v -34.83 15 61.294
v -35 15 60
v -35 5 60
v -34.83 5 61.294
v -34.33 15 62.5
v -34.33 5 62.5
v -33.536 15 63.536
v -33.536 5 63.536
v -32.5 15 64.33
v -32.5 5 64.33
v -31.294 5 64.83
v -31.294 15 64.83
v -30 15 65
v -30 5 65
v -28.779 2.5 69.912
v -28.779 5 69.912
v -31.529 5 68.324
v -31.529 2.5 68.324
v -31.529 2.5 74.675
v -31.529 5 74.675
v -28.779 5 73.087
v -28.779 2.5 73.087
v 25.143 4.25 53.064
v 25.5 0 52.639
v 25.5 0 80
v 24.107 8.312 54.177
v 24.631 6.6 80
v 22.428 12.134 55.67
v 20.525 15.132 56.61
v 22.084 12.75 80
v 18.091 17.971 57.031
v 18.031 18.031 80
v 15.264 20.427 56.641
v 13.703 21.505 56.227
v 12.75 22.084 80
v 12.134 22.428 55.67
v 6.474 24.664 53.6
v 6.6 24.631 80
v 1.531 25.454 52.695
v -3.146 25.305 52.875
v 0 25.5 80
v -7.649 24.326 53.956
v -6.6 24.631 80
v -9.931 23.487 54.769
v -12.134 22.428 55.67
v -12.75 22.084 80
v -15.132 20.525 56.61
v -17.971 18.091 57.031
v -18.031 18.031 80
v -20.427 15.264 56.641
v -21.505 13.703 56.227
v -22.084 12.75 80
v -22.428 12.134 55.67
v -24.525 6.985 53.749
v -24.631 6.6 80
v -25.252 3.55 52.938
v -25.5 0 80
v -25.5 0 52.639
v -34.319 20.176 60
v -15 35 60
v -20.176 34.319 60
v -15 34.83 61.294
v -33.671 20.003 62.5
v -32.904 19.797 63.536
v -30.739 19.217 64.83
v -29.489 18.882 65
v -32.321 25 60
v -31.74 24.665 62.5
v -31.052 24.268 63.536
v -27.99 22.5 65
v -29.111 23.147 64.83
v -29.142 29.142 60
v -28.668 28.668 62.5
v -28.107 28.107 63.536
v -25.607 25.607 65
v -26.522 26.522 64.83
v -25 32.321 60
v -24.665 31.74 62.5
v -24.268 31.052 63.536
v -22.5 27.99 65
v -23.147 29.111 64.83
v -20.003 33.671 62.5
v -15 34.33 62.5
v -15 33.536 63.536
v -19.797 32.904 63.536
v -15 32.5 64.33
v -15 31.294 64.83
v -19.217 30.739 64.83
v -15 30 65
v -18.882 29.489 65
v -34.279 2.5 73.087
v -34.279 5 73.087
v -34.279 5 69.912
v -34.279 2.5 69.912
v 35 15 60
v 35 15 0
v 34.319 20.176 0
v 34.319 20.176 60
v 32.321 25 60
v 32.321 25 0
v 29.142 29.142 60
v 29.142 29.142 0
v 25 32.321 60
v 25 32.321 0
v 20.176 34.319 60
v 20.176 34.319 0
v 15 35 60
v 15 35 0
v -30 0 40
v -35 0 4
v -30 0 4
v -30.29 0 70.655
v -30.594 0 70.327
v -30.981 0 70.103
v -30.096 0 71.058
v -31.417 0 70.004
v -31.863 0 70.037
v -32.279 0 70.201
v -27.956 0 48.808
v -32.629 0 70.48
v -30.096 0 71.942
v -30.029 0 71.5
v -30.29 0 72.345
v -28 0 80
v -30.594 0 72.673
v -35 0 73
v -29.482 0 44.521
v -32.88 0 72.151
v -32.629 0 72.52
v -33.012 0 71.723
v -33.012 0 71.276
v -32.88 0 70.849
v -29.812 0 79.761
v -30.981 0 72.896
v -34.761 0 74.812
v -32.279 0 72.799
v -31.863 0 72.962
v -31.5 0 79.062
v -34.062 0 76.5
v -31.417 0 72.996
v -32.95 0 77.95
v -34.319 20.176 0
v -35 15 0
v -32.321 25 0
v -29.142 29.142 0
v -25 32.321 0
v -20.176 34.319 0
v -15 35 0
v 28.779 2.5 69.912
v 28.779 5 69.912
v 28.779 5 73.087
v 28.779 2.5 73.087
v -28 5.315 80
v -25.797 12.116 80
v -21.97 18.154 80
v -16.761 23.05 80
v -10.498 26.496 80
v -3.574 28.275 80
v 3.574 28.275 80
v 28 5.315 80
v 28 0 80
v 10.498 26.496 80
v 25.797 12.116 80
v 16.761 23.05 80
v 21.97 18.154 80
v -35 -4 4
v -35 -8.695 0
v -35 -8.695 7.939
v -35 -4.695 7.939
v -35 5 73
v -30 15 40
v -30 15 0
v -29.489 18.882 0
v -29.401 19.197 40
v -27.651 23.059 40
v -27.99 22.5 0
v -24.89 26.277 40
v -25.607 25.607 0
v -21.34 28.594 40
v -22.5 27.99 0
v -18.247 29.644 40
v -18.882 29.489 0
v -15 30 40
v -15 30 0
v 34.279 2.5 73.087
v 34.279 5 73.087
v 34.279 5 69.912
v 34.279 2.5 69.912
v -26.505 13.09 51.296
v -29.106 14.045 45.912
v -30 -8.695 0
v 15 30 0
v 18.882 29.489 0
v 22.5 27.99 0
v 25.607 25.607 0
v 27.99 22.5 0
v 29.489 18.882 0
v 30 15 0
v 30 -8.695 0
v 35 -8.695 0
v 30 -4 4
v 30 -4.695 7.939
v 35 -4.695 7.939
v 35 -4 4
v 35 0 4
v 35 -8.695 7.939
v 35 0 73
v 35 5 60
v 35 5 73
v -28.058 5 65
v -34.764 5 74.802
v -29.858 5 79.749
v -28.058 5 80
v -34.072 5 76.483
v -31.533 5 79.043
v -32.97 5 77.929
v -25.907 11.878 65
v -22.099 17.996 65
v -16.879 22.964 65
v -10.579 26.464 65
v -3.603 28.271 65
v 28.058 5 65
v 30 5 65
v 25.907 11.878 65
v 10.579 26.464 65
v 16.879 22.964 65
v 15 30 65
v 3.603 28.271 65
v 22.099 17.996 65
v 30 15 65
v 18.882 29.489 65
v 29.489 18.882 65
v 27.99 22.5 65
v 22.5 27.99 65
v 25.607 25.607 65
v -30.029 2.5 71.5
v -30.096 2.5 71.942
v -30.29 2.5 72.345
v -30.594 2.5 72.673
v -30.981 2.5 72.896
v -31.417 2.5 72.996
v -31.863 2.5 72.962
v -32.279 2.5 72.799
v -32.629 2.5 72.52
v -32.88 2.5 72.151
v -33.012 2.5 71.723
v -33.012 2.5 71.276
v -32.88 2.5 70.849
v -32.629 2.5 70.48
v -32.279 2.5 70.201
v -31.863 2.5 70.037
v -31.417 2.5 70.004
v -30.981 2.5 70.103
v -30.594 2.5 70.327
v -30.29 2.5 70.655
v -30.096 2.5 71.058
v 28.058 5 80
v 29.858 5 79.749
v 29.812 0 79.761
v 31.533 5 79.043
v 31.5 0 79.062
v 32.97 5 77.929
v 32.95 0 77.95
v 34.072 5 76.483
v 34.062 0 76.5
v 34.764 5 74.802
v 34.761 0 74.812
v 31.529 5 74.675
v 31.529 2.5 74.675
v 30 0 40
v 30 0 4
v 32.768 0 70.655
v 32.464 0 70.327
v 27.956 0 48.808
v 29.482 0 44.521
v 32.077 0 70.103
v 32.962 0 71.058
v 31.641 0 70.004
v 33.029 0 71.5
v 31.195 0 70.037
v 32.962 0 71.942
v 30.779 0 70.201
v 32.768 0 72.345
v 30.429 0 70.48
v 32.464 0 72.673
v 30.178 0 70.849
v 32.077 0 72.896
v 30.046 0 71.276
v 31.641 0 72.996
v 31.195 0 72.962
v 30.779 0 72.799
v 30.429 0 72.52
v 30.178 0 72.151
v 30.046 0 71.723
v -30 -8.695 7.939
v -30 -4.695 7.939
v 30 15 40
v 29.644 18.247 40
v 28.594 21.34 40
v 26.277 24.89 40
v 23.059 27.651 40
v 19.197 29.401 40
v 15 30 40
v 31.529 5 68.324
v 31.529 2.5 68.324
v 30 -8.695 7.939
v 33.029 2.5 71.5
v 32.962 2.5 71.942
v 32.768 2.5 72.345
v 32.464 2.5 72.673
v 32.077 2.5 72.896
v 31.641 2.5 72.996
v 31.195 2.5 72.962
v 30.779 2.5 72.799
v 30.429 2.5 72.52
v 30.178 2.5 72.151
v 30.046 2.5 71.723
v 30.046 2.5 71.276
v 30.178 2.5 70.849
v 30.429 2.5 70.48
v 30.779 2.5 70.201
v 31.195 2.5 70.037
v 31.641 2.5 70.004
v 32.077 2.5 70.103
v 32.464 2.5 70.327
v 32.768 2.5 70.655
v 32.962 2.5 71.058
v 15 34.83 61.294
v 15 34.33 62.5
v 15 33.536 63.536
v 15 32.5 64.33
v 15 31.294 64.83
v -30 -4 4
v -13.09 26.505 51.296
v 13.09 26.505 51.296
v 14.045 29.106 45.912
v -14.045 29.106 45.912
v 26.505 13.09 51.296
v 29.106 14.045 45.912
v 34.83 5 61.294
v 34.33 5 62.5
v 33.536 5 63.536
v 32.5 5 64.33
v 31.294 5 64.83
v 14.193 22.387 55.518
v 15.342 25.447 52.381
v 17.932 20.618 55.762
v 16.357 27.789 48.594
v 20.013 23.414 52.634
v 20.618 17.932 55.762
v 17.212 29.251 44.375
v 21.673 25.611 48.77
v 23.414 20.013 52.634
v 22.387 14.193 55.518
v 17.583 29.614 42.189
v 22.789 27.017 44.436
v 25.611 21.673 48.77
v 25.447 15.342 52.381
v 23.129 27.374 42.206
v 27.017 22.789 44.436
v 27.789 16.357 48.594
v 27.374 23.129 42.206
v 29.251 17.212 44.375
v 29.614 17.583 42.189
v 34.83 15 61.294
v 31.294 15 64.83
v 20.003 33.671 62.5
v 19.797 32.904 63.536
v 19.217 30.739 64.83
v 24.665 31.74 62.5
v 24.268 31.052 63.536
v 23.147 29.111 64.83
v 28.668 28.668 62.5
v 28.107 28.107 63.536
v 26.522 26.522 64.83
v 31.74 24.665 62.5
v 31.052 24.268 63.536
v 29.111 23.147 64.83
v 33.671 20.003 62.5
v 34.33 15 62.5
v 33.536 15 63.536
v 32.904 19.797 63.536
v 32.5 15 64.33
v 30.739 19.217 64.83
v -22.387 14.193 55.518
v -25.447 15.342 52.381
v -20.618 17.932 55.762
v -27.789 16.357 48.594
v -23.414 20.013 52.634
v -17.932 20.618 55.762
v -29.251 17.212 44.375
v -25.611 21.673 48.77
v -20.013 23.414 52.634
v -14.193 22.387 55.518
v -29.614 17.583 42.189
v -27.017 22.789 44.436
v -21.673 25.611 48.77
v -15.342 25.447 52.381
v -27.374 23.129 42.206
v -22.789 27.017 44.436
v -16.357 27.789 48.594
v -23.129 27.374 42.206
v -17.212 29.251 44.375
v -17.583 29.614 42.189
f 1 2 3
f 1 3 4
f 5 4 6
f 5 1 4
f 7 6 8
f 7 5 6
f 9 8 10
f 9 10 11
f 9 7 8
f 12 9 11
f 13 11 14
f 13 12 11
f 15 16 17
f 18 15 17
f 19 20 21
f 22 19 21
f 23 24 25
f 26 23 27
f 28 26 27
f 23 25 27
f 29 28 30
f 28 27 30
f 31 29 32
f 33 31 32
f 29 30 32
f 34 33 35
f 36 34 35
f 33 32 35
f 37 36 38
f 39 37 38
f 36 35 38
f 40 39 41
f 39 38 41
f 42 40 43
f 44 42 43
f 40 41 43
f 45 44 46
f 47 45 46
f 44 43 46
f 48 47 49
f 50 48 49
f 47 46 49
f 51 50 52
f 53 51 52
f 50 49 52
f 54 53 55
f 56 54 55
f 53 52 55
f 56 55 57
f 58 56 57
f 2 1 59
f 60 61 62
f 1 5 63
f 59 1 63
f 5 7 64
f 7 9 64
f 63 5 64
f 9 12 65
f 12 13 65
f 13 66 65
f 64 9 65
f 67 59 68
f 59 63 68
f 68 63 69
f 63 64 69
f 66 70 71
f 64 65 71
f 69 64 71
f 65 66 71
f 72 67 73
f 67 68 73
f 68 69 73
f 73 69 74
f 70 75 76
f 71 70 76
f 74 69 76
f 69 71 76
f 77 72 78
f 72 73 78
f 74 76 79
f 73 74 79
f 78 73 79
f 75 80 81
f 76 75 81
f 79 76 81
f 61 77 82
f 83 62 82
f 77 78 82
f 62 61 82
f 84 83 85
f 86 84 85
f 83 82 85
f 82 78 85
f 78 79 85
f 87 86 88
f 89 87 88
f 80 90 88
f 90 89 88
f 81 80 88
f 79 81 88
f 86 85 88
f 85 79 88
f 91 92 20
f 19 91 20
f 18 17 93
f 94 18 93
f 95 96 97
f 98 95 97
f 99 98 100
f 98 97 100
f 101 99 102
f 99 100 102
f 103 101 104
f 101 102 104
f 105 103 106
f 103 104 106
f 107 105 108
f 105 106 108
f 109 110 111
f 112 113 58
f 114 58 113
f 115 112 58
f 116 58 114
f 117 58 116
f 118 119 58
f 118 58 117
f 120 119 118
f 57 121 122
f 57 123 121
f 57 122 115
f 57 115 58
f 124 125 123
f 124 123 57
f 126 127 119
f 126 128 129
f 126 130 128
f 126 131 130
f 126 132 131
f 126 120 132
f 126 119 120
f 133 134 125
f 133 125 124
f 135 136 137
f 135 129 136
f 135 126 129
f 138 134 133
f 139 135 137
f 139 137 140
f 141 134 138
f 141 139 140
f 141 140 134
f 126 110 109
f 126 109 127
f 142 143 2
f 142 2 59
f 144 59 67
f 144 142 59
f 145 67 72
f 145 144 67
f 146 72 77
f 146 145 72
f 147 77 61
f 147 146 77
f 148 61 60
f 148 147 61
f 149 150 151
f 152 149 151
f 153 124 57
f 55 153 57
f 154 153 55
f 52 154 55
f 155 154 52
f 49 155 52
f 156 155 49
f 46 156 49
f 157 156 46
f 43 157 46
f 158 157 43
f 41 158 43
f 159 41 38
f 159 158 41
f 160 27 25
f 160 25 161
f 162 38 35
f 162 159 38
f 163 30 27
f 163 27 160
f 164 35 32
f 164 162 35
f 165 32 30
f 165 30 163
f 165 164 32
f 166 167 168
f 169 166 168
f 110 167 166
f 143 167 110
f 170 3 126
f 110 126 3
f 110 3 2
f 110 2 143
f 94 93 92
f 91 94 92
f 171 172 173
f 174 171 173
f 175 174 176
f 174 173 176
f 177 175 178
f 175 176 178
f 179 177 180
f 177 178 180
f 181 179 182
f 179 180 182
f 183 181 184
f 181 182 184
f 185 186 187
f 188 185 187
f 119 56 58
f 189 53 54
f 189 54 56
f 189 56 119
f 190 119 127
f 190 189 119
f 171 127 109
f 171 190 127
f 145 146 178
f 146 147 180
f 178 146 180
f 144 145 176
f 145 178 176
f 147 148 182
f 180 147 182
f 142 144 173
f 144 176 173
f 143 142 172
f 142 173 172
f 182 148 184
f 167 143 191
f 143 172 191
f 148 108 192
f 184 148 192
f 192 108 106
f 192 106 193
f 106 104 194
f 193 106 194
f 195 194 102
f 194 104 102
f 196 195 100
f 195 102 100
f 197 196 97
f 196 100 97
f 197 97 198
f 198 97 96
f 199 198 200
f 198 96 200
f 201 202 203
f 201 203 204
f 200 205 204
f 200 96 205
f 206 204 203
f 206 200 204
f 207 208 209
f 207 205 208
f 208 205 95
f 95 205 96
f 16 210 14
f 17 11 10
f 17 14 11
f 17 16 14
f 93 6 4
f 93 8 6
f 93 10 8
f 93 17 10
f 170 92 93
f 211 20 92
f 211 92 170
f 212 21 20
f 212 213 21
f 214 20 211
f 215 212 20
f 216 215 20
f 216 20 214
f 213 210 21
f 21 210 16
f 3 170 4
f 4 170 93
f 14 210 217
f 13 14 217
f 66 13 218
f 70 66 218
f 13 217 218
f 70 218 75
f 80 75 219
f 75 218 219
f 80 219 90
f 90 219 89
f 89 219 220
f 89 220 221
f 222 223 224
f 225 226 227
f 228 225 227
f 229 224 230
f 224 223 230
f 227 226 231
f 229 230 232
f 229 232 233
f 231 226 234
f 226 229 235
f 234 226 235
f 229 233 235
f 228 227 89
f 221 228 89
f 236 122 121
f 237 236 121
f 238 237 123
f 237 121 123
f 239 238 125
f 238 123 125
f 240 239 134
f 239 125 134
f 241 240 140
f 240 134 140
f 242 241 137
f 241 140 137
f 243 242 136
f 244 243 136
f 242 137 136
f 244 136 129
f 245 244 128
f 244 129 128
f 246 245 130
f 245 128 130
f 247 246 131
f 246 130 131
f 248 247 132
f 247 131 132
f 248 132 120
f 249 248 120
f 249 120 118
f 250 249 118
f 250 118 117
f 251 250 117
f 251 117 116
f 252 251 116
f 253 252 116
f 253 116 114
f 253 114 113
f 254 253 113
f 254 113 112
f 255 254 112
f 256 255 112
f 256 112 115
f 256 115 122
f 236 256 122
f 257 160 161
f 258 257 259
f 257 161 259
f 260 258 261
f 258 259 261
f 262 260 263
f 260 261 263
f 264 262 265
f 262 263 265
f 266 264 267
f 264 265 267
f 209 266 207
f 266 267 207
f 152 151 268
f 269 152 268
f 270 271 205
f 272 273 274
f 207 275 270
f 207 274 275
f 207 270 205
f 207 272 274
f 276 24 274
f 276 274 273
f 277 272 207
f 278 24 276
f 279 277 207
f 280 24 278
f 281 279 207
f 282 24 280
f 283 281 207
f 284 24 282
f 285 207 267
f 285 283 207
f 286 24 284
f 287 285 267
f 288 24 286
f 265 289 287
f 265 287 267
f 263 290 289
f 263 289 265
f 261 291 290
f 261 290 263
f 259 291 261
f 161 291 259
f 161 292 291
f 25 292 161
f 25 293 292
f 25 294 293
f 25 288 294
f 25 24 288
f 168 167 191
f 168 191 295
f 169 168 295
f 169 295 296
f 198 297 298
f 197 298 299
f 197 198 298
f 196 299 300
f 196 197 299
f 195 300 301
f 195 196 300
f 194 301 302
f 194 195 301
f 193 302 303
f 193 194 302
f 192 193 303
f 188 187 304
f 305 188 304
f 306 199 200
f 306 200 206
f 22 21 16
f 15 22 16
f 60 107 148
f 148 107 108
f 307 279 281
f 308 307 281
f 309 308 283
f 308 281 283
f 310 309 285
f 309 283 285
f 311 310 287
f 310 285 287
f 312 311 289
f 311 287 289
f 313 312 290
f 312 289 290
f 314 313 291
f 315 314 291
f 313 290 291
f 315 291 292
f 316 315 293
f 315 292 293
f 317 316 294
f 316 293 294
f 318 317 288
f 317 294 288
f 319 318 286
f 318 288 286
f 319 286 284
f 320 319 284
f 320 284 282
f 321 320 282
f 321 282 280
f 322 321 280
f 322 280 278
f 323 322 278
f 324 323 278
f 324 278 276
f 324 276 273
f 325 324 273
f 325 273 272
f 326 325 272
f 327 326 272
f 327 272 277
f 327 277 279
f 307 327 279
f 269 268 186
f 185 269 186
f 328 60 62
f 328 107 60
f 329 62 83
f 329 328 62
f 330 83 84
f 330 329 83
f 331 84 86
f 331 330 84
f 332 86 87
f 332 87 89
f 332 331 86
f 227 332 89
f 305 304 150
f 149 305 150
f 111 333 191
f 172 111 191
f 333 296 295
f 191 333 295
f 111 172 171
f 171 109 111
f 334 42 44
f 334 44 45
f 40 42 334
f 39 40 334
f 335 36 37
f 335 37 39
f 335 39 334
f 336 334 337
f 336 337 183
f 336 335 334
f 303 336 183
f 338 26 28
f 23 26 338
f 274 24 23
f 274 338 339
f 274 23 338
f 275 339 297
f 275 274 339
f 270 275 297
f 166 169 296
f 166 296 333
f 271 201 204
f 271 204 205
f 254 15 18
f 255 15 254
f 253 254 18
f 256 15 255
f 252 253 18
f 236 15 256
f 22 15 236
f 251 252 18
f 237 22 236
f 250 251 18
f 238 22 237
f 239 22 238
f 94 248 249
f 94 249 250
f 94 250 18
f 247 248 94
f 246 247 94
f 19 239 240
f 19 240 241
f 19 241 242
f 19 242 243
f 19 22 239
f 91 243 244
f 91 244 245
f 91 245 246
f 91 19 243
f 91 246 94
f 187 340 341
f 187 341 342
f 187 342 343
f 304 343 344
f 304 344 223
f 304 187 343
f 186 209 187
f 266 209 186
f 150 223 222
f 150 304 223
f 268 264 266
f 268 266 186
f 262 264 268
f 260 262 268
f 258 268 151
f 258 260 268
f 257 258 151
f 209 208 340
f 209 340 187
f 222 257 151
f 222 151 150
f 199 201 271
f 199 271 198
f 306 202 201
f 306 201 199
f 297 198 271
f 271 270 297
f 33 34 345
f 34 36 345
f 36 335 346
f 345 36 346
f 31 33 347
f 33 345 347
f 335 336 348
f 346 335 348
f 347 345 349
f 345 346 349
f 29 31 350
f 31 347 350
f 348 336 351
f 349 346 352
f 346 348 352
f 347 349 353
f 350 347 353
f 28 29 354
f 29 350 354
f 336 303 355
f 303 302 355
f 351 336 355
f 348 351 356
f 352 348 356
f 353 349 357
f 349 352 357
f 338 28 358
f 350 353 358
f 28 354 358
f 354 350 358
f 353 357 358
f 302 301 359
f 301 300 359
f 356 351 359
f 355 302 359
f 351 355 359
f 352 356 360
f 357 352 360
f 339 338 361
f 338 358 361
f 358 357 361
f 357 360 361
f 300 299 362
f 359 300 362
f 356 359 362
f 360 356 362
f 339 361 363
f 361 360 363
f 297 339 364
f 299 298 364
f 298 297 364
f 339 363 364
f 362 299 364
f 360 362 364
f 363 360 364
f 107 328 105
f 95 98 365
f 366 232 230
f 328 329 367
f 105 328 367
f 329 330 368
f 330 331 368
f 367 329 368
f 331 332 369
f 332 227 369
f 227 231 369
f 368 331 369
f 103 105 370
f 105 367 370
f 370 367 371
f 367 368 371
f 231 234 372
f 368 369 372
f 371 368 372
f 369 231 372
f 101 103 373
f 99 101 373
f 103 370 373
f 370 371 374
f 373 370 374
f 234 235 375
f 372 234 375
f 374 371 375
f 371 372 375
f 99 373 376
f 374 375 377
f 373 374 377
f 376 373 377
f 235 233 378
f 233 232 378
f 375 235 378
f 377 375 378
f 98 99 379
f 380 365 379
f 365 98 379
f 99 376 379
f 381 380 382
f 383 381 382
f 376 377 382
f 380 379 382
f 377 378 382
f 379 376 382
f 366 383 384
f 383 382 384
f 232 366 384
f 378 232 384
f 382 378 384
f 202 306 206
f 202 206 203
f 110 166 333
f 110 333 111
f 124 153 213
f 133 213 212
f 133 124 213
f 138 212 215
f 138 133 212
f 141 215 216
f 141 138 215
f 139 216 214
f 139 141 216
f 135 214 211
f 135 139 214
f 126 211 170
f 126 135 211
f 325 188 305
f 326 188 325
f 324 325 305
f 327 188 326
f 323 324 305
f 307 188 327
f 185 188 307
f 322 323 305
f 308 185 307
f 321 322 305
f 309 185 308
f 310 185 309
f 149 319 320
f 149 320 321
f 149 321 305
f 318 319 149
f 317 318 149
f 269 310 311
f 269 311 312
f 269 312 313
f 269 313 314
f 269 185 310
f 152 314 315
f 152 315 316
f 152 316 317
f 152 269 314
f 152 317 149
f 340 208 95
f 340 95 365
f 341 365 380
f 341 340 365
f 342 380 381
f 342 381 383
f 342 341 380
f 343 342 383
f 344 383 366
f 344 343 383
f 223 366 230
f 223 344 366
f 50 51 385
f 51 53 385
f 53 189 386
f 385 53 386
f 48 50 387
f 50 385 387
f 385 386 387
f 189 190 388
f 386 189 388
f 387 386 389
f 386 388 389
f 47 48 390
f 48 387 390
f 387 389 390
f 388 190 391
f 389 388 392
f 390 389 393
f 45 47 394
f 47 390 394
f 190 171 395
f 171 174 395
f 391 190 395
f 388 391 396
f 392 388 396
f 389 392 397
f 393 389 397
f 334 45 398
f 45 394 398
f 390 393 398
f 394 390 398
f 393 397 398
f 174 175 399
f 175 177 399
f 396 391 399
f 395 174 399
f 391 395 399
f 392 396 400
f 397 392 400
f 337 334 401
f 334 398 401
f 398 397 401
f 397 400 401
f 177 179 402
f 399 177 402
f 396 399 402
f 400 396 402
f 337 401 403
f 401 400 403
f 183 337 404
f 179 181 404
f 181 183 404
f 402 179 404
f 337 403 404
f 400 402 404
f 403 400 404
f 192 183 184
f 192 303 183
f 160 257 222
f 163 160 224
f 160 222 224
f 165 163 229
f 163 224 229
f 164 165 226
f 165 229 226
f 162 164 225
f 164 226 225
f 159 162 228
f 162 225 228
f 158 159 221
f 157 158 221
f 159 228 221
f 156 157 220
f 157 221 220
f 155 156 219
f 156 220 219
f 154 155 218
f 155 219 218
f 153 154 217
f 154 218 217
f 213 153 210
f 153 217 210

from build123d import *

# Parameters (mm, degrees)
PAD_DEPTH       = 35
SKETCH001_R     = 27.5
PAD001_DEPTH    = 30
FILLET_R        = 20
THICKNESS_T     = -5
FILLET001_R     = 15
FILLET002_R     = 5
CHAMFER_SIZE2   = 25
CHAMFER_SIZE    = 3
FILLET003_R     = 20
SKETCH002_R     = 28.5
PAD002_DEPTH    = 15
SKETCH003_R     = 25.5
POCKET_DEPTH    = 80.001
SKETCH004_W     = 9
SKETCH004_H     = 20
PAD003_DEPTH    = 5
FILLET004_R     = 7
SKETCH006_R     = 1.5
POCKET002_DEPTH = 40.001
POCKET003_DEPTH = 2.5
POCKET004_DEPTH = 70.001


with BuildPart() as part:
    # Sketch → Pad (new body, symmetric)
    with BuildSketch(Plane.YZ):
        Polygon((-85, 0), (-85, 15), (-35, 65), (35, 65), (35, 0), align=None)
    extrude(amount=PAD_DEPTH, both=True)

    # Sketch001 (on Face2 of Pad) → Pad001 (join)
    with BuildSketch(Plane(origin=(0, -50, 50), x_dir=(0, -0.707107, -0.707107), z_dir=(0, -0.707107, 0.707107))):
        with Locations((14.142136, 0)):
            Circle(SKETCH001_R)
    extrude(amount=PAD001_DEPTH)

    # Fillet
    fillet_edges = [part.edges().sort_by_distance(p)[0] for p in [
        (-35, 35, 32.5),
        (-35, -85, 7.5),
        (35, -85, 7.5),
        (35, 35, 32.5),
    ]]
    fillet(fillet_edges, radius=FILLET_R)

    # Thickness
    thickness_openings = [part.faces().sort_by_distance(p)[0] for p in [
        (0, -25, 0),
        (0, -81.213203, 61.213203),
    ]]
    offset(amount=THICKNESS_T, openings=thickness_openings)

    # Fillet001
    fillet001_edges = [part.edges().sort_by_distance(p)[0] for p in [
        (0, -35, 65),
    ]]
    fillet(fillet001_edges, radius=FILLET001_R)

    # Fillet002
    fillet002_edges = [part.edges().sort_by_distance(p)[0] for p in [
        (-35, -6.893398, 65),
    ]]
    fillet(fillet002_edges, radius=FILLET002_R)

    # Chamfer
    chamfer_edges = [part.edges().sort_by_distance(p)[0] for p in [
        (0, -65.303301, 77.123106),
    ]]
    chamfer_side = part.faces().sort_by_distance((0, -62.317767, 80.10864))[0]
    chamfer(chamfer_edges, length=CHAMFER_SIZE, length2=CHAMFER_SIZE2, reference=chamfer_side)

    # Fillet003
    fillet003_edges = [part.edges().sort_by_distance(p)[0] for p in [
        (-25.606602, 25.606602, 60),
    ]]
    fillet(fillet003_edges, radius=FILLET003_R)

    # Sketch002 (on Face41 of Fillet003) → Pad002 (join)
    with BuildSketch(Plane.XY.offset(65)):
        Circle(SKETCH002_R)
    extrude(amount=PAD002_DEPTH)

    # Sketch003 (on Face46 of Pad002) → Pocket (cut, through all)
    with BuildSketch(Plane.XY.offset(80)):
        Circle(SKETCH003_R)
    extrude(amount=-POCKET_DEPTH, mode=Mode.SUBTRACT)

    # Sketch004 → Pad003 (join, symmetric)
    with BuildSketch(Plane(origin=(0, 0, 0), x_dir=(-1, 0, 0), z_dir=(0, 1, 0))):
        with Locations((-30.5, 70)):
            Rectangle(SKETCH004_W, SKETCH004_H)
        with Locations((30.5, 70)):
            Rectangle(SKETCH004_W, SKETCH004_H)
    extrude(amount=PAD003_DEPTH, both=True)

    # Fillet004
    fillet004_edges = [part.edges().sort_by_distance(p)[0] for p in [
        (35, 0, 80),
        (-35, 0, 80),
    ]]
    fillet(fillet004_edges, radius=FILLET004_R)

    # Sketch006 (on Face2 of Fillet004) → Pocket002 (cut, through all)
    with BuildSketch(Plane.XZ.offset(5)):
        with Locations((-31.528988, 71.49976)):
            Circle(SKETCH006_R)
        with Locations((31.528988, 71.49976)):
            Circle(SKETCH006_R)
    extrude(amount=-POCKET002_DEPTH, mode=Mode.SUBTRACT)

    # Sketch007 (on Face11 of Pocket002) → Pocket003 (cut)
    with BuildSketch(Plane(origin=(0, 5, 0), x_dir=(-1, 0, 0), z_dir=(0, 1, 0))):
        Polygon((-28.778988, 69.912047), (-28.778988, 73.087473), (-31.528988, 74.675186), (-34.278988, 73.087473), (-34.278988, 69.912047), (-31.528988, 68.324333), align=None)
        Polygon((34.278988, 69.912047), (34.278988, 73.087473), (31.528988, 74.675186), (28.778988, 73.087473), (28.778988, 69.912047), (31.528988, 68.324333), align=None)
    extrude(amount=-POCKET003_DEPTH, mode=Mode.SUBTRACT)

    # Sketch008 (on Face16 of Pocket003) → Pocket004 (cut, through all)
    with BuildSketch(Plane(origin=(-35, 0, 0), x_dir=(0, -1, 0), z_dir=(-1, 0, 0))):
        Polygon((0, 94.046894), (120.73246, 94.046894), (120.73246, 0), (8.694593, 0), (8.694593, 7.939231), (4.694593, 7.939231), (4, 4), (0, 4), align=None)
    extrude(amount=-POCKET004_DEPTH, mode=Mode.SUBTRACT)


solid = part.part
